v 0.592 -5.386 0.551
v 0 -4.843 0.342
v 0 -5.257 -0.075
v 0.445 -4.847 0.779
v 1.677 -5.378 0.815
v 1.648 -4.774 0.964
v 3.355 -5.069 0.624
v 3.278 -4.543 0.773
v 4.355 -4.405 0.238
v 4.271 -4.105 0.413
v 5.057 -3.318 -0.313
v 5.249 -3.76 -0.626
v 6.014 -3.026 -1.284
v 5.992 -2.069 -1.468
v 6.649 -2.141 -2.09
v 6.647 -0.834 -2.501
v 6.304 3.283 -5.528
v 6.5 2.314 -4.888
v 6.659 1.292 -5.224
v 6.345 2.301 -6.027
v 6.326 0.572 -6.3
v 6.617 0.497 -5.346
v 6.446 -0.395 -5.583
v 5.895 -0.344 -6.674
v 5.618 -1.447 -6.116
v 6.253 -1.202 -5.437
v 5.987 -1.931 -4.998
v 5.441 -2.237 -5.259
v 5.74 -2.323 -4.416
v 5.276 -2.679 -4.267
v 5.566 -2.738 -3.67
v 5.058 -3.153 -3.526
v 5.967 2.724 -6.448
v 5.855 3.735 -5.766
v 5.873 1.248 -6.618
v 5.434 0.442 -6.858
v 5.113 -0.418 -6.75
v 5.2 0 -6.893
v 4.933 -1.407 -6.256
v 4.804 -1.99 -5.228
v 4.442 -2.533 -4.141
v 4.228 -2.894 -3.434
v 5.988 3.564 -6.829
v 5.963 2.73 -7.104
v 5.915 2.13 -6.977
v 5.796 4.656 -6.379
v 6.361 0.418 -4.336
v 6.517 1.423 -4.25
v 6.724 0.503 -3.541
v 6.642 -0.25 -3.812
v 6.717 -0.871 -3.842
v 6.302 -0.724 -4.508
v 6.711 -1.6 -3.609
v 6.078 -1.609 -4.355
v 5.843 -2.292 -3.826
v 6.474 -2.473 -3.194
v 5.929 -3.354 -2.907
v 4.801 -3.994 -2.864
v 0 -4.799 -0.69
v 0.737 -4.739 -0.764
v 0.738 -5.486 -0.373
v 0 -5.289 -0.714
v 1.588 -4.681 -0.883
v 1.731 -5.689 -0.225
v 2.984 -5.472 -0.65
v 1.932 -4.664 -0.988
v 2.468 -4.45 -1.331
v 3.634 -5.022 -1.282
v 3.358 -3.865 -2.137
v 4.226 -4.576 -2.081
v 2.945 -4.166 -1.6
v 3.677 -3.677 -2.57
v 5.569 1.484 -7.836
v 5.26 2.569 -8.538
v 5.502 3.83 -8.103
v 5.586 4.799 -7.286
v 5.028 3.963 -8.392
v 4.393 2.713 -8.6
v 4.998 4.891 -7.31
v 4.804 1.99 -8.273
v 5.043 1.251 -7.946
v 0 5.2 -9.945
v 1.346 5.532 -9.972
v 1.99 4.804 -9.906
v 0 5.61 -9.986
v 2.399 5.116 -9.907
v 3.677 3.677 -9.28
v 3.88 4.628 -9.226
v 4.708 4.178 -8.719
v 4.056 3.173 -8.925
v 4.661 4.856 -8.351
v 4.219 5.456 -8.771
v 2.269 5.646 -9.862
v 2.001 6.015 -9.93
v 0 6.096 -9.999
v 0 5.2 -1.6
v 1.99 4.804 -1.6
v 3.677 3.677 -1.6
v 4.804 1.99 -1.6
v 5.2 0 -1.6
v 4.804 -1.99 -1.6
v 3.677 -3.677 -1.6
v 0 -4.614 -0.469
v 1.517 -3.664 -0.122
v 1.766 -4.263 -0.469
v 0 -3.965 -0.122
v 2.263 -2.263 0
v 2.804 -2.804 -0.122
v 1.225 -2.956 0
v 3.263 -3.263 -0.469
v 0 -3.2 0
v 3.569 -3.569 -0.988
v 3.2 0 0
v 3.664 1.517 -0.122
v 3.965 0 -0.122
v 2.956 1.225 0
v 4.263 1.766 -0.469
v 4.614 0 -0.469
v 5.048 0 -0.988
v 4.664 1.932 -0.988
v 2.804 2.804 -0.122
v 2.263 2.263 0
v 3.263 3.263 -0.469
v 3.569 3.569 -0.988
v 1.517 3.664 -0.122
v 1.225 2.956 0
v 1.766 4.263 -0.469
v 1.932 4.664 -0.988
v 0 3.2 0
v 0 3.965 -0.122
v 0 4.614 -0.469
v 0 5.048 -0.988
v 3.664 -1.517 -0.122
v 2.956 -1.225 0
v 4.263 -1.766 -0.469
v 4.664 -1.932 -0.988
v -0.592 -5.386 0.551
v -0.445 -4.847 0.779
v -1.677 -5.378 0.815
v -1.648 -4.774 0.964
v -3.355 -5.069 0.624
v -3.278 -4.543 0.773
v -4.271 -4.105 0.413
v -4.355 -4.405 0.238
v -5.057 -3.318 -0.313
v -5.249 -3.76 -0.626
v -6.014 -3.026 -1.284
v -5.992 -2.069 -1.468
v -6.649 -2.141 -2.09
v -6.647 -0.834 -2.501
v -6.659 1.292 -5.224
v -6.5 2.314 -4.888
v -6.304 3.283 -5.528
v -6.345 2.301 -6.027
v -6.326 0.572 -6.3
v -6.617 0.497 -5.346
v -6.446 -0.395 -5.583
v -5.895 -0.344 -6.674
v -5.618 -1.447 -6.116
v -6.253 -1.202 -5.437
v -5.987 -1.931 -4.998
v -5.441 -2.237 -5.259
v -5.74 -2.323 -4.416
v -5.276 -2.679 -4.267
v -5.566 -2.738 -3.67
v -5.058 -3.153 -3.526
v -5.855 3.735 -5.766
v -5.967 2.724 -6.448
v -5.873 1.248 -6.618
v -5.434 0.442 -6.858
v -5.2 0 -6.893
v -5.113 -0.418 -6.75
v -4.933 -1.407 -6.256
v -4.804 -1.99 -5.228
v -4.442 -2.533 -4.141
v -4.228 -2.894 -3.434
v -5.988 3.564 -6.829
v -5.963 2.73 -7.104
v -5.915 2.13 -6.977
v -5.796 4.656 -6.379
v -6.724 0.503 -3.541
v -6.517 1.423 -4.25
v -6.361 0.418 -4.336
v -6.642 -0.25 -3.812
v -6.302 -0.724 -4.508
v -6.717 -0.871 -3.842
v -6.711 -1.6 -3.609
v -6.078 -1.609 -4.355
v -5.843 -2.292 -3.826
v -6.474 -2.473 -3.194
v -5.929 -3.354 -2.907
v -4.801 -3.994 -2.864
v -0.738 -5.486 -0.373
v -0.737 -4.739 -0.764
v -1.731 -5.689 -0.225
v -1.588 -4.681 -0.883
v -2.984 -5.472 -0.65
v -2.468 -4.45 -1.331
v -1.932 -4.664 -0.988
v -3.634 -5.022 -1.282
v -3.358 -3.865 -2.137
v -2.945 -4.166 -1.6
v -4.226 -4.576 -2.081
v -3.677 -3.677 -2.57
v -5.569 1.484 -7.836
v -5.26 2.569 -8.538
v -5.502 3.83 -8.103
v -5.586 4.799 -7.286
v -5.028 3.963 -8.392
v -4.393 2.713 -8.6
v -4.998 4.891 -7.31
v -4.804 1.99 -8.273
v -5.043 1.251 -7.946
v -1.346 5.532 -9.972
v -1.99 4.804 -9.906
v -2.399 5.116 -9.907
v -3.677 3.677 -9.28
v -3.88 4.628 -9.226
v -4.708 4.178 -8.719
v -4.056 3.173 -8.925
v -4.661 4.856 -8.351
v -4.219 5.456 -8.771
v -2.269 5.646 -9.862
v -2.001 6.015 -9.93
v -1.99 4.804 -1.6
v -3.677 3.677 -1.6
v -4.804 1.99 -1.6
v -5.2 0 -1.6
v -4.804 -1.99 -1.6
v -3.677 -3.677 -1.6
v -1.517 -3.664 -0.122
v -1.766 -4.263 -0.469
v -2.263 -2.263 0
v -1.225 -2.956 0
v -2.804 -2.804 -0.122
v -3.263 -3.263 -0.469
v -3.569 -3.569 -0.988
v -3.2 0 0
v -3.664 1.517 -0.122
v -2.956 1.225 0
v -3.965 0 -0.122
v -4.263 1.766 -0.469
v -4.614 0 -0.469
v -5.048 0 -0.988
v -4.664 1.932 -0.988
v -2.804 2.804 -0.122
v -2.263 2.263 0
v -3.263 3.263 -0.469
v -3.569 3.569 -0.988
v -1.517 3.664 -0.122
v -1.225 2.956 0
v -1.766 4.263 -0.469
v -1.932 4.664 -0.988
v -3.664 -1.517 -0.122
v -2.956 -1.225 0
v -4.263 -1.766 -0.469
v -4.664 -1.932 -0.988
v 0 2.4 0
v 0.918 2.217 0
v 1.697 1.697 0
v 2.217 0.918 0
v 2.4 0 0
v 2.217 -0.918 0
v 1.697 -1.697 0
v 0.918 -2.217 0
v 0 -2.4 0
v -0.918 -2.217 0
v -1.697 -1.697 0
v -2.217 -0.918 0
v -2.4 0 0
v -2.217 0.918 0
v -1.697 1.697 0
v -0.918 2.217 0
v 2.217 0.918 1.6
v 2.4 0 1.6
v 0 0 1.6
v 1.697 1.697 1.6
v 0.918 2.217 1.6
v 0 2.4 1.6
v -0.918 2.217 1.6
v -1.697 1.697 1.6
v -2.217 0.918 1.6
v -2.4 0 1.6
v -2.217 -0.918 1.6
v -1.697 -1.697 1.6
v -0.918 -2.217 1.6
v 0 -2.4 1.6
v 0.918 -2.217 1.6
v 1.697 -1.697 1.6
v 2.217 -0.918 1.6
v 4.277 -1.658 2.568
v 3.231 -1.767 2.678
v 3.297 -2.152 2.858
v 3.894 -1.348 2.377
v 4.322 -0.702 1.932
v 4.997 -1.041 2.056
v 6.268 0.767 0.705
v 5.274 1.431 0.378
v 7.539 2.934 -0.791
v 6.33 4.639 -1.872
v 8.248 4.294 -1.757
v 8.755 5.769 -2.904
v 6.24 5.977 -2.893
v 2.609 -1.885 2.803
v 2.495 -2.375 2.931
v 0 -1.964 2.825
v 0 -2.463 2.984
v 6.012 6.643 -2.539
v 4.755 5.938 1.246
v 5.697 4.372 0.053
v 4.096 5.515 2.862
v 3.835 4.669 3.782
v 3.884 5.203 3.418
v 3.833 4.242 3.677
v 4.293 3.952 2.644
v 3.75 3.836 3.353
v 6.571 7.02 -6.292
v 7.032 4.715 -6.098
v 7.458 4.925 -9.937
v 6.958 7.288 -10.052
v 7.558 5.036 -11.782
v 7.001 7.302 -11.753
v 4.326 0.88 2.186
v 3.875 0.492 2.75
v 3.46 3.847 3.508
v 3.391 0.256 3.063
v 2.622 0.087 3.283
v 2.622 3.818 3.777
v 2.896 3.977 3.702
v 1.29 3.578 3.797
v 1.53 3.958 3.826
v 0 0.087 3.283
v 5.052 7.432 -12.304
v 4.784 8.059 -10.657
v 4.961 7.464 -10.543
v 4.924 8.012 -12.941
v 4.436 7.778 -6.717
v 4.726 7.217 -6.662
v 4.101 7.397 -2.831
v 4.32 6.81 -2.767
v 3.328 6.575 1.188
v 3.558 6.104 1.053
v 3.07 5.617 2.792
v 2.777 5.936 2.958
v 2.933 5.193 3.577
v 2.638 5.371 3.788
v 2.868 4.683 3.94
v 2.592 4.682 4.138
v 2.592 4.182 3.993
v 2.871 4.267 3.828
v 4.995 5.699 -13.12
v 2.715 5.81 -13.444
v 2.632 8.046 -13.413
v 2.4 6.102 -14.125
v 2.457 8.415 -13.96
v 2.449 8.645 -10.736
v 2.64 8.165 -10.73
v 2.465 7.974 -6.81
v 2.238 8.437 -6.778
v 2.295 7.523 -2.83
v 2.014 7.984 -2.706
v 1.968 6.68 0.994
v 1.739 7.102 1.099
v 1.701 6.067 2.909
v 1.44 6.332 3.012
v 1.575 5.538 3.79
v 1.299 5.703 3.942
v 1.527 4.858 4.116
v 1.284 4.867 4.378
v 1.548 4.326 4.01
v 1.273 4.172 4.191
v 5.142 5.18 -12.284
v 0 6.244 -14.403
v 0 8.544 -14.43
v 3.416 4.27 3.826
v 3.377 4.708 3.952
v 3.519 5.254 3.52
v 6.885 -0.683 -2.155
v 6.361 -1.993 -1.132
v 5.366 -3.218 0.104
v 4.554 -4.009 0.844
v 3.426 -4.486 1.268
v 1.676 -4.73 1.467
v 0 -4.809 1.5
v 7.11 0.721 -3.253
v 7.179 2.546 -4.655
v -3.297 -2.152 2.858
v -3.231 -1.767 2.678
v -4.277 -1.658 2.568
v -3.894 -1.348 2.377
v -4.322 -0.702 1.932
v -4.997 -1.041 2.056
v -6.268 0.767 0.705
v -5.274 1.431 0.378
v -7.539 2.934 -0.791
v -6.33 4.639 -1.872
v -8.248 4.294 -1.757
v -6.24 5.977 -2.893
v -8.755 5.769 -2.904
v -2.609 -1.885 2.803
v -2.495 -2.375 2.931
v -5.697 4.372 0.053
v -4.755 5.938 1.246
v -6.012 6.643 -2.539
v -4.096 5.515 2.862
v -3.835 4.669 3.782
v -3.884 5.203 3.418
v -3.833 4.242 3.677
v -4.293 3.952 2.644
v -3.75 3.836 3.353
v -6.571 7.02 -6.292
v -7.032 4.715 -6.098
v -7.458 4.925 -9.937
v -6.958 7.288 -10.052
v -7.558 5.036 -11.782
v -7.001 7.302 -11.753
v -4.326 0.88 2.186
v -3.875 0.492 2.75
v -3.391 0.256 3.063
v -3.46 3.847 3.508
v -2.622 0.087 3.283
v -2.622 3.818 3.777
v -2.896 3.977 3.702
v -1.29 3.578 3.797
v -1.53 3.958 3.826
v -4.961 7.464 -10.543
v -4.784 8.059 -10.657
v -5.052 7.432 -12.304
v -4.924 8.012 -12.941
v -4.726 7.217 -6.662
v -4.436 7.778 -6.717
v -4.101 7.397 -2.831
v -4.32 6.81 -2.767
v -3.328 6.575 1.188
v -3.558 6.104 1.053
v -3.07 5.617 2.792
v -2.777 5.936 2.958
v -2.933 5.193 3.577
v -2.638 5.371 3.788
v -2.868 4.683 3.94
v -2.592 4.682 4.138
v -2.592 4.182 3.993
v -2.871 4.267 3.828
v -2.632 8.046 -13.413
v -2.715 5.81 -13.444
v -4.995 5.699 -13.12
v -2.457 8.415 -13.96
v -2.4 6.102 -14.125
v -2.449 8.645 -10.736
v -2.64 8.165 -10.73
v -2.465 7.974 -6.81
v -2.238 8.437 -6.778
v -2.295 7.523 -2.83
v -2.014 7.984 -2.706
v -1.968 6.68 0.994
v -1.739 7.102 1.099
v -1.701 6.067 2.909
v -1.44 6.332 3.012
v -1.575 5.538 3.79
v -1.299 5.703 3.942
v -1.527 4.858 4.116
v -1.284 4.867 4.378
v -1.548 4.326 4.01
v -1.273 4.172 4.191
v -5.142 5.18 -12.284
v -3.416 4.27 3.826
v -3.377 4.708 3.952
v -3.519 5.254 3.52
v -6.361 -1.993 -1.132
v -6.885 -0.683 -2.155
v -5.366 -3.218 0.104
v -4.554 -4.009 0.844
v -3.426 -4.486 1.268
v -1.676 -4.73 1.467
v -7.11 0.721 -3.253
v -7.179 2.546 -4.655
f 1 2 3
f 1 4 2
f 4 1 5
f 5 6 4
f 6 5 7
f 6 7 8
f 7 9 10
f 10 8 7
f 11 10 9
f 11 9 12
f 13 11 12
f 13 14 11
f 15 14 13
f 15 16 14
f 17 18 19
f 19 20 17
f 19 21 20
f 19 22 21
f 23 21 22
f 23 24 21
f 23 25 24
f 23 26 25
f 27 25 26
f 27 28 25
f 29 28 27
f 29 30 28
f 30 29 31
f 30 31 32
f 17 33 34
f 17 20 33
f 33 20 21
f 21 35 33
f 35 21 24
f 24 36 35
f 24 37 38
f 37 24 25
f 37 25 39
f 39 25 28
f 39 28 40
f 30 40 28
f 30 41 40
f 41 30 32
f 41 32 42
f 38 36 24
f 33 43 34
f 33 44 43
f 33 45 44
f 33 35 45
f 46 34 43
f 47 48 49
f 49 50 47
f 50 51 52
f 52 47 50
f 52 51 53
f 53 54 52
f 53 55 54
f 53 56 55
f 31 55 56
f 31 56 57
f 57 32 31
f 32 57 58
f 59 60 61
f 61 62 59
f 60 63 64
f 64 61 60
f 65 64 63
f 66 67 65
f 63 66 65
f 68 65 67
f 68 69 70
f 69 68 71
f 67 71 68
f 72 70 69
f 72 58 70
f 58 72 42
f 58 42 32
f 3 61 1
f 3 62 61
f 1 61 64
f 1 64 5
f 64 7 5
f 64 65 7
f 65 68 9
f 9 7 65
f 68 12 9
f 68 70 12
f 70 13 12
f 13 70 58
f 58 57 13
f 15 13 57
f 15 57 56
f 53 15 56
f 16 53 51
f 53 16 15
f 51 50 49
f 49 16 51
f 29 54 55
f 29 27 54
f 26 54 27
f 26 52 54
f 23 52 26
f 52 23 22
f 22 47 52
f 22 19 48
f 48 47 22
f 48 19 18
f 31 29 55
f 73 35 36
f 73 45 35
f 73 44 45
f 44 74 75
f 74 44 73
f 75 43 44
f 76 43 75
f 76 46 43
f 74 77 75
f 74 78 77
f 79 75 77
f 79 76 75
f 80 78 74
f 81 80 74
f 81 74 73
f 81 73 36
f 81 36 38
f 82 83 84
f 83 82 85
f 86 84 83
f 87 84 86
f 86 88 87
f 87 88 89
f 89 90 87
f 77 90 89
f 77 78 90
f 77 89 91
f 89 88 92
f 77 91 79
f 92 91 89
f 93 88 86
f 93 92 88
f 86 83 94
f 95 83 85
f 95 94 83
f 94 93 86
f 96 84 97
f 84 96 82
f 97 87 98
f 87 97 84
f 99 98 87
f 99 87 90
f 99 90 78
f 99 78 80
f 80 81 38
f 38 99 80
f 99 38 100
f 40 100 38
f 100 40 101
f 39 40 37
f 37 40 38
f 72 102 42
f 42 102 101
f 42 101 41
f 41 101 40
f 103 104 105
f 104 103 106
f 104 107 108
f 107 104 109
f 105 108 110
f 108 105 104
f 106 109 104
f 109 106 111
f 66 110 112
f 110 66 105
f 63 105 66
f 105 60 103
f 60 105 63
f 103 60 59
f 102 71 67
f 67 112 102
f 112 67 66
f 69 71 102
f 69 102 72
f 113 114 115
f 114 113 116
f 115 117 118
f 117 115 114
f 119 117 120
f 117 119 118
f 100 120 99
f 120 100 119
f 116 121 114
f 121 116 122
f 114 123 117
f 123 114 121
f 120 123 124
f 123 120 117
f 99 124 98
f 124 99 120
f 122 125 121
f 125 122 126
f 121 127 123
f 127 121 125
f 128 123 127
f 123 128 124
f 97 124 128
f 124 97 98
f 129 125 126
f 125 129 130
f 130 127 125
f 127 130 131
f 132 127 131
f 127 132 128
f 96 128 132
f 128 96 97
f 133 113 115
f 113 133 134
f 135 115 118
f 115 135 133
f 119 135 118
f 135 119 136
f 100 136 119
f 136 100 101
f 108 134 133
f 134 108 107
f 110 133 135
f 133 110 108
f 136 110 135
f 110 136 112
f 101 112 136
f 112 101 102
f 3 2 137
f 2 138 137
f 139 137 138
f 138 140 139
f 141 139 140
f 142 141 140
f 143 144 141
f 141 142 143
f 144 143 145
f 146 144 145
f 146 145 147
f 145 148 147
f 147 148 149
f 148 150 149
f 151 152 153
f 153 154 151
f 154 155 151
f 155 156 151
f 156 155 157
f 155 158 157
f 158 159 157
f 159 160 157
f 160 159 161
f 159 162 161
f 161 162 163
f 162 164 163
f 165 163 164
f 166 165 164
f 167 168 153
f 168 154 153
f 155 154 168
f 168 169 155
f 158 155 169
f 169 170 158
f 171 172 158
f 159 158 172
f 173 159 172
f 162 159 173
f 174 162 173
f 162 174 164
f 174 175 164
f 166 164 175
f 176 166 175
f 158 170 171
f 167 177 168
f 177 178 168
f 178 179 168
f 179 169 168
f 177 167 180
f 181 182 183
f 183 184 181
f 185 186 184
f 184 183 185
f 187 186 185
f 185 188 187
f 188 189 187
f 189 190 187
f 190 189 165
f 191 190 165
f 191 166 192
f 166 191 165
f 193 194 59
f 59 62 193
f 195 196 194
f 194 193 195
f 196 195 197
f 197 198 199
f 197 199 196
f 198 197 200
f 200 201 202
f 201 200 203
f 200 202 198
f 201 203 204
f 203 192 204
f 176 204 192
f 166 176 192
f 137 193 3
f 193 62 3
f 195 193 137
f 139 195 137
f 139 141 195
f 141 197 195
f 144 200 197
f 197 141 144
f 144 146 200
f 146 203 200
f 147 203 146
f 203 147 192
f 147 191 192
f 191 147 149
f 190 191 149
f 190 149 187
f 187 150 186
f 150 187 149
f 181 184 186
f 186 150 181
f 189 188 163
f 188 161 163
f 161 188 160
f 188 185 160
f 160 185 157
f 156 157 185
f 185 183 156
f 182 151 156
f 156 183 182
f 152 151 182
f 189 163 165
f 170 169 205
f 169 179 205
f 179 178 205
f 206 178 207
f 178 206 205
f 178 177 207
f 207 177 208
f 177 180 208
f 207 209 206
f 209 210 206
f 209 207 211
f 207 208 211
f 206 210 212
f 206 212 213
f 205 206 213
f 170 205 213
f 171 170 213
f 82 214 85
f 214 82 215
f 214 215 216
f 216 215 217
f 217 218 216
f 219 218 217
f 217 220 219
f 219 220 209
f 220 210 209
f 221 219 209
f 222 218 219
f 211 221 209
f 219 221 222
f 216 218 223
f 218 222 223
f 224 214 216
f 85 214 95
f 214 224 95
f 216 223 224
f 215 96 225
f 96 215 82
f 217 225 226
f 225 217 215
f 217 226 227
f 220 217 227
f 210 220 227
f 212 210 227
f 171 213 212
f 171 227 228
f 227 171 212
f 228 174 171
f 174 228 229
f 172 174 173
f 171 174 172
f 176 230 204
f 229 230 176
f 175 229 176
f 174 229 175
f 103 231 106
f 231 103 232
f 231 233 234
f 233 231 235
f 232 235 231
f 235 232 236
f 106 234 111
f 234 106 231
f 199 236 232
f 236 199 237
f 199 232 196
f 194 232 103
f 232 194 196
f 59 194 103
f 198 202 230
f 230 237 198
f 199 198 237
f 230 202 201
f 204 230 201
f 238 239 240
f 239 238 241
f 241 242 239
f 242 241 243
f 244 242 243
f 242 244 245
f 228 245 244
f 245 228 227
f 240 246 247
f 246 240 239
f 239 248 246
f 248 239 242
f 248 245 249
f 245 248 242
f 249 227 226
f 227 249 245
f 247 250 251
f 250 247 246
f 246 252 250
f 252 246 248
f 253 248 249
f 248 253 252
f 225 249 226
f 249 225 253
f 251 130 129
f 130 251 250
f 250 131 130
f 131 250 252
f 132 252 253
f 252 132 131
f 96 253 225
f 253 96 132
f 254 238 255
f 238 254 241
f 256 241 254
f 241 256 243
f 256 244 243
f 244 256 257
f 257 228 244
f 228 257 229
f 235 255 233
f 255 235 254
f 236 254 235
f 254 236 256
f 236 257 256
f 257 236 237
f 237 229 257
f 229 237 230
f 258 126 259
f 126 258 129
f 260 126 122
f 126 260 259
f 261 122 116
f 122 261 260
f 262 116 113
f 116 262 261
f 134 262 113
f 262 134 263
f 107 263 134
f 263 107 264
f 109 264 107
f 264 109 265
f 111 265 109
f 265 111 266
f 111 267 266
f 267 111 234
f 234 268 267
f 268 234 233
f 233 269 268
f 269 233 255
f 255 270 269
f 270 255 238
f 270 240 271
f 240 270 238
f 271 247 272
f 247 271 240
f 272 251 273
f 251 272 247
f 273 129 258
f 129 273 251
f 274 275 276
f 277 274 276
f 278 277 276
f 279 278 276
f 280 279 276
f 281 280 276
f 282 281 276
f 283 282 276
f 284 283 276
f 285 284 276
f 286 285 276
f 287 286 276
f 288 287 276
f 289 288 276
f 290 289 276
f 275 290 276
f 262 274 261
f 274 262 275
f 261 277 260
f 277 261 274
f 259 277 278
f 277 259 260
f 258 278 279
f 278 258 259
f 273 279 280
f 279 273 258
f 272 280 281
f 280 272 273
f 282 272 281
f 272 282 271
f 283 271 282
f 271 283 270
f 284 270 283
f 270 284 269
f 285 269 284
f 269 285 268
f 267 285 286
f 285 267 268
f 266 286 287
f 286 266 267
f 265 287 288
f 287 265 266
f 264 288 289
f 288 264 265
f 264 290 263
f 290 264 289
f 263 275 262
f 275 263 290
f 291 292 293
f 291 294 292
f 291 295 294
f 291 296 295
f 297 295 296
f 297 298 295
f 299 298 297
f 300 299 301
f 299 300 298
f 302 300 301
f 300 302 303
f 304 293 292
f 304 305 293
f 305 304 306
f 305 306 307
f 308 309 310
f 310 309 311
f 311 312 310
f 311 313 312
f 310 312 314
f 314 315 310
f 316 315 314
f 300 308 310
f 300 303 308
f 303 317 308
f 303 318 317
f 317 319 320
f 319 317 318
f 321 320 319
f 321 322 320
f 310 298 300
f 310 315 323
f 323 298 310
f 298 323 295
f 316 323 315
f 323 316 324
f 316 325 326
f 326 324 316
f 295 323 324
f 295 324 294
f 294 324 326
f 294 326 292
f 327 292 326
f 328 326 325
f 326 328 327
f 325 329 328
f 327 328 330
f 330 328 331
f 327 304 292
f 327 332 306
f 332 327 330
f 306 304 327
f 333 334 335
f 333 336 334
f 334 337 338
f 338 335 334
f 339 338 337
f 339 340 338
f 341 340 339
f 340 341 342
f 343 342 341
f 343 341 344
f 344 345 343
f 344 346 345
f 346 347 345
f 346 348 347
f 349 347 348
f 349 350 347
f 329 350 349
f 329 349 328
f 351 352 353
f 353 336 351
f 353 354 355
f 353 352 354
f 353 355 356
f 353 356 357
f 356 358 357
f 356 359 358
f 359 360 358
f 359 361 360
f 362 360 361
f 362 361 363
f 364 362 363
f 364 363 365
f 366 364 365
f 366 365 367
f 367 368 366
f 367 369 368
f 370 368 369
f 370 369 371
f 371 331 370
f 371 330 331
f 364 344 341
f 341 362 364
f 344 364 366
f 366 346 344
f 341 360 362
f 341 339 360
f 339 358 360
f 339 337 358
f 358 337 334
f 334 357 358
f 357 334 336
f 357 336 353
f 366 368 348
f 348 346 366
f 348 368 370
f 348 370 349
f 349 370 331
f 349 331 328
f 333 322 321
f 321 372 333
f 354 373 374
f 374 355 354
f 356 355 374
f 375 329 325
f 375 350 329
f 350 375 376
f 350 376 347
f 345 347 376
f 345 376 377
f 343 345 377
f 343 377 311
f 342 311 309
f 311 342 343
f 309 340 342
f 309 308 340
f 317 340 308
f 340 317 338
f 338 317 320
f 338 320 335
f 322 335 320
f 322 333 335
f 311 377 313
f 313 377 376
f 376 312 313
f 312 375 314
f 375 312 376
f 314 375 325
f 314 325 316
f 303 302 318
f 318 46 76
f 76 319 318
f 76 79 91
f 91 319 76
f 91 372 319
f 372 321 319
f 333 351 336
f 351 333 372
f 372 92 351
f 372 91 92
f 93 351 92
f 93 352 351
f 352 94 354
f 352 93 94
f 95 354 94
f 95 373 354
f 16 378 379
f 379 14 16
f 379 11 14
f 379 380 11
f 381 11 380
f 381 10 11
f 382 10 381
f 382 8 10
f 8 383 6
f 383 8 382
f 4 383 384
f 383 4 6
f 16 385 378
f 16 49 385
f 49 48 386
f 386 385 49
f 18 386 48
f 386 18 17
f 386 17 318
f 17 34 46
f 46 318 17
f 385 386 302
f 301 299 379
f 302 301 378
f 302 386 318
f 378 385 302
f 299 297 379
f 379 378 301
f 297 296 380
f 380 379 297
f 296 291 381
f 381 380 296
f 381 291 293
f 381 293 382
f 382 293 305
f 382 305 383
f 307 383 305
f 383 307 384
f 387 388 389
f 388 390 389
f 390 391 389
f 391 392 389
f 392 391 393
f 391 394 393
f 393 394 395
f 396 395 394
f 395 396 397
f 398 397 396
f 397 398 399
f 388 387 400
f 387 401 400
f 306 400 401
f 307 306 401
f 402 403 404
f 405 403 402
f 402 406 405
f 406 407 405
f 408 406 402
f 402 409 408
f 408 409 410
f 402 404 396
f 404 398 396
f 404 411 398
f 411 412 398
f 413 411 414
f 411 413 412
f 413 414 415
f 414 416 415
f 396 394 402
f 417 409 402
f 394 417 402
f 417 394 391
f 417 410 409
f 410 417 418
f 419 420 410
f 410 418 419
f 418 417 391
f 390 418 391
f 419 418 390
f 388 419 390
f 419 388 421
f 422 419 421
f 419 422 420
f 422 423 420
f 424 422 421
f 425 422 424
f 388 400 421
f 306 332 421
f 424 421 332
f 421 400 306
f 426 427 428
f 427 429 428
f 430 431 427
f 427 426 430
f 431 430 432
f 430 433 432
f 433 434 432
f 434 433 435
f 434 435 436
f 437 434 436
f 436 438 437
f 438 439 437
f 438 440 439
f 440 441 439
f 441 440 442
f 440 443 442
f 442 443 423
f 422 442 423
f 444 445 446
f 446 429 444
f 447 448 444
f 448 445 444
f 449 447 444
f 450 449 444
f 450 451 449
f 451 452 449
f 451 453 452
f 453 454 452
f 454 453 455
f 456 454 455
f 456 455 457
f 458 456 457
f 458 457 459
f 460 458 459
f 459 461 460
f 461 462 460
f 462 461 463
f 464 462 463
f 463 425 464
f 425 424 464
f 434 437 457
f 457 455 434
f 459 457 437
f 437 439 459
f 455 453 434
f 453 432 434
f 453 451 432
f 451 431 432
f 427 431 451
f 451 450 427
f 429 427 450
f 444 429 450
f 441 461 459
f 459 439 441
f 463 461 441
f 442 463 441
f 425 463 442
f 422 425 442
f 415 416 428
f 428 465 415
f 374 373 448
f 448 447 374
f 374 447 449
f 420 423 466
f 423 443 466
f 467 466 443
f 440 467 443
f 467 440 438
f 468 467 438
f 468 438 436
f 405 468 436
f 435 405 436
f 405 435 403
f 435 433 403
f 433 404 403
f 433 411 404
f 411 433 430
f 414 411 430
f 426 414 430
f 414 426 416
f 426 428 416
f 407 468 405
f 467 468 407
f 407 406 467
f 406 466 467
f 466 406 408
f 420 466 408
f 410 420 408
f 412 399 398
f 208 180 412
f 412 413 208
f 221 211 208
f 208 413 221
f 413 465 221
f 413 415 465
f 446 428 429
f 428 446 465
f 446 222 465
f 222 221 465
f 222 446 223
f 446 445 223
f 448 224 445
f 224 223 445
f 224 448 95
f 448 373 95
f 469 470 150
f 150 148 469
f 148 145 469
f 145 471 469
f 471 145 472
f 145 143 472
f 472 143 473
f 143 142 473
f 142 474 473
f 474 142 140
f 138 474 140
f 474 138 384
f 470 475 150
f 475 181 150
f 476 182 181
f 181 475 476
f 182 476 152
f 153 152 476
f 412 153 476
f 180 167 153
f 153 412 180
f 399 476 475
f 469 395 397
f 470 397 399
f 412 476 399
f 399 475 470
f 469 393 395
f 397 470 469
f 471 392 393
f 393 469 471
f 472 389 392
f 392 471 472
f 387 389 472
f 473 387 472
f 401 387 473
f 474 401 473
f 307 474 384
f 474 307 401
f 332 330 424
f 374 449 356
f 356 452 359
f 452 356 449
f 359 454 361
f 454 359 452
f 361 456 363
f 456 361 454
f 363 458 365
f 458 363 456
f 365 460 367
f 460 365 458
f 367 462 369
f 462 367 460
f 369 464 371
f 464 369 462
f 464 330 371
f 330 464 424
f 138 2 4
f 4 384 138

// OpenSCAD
use <../lib.scad>
use <s/80834s01.scad>
use <s/80834s02.scad>
function ldraw_lib__80834p01() = [
// 0 Minifig Hair with Nurse Hat with Long Back with Light Bluish Grey Hair Pattern
// 0 Name: 80834p01.dat
// 0 Author: Philippe Hurbain [Philo]
// 0 !LDRAW_ORG Part UPDATE 2024-04
// 0 !LICENSE Licensed under CC BY 4.0 : see CAreadme.txt
// 
// 0 BFC CERTIFY CCW
  [0,"BFC","CERTIFY"],
  [0,"BFC","CCW"],
// 
// 0 !CATEGORY Minifig Headwear
// 0 !KEYWORDS Bricklink 80834pb01, Madam Pomfrey, Rebrickable 80834pat0001
// 0 !KEYWORDS Set 76398
// 
// 0 !HISTORY 2022-05-05 {LEGO Instructions App} Original part shape
// 0 !HISTORY 2022-05-05 [Philo] File preparation for LDraw Parts Tracker
// 0 !HISTORY 2024-05-28 [OrionP] Official Update 2024-04
// 
// 
// 1 71 0 0 0 1 0 0 0 1 0 0 0 1 s\80834s01.dat
  [1,71,0,0,0,1,0,0,0,1,0,0,0,1, ldraw_lib__s__80834s01()],
// 1 16 0 0 0 1 0 0 0 1 0 0 0 1 s\80834s02.dat
  [1,16,0,0,0,1,0,0,0,1,0,0,0,1, ldraw_lib__s__80834s02()],
];
module ldraw_lib__80834p01(step=0, col=false, unit=2/5, alt=false, line=0.2, solid=!$preview)
    makepoly(ldraw_lib__80834p01(), step=step, col=col, unit=unit, alt=alt, line=line, solid=solid);
ldraw_lib__80834p01(line=0.2);
